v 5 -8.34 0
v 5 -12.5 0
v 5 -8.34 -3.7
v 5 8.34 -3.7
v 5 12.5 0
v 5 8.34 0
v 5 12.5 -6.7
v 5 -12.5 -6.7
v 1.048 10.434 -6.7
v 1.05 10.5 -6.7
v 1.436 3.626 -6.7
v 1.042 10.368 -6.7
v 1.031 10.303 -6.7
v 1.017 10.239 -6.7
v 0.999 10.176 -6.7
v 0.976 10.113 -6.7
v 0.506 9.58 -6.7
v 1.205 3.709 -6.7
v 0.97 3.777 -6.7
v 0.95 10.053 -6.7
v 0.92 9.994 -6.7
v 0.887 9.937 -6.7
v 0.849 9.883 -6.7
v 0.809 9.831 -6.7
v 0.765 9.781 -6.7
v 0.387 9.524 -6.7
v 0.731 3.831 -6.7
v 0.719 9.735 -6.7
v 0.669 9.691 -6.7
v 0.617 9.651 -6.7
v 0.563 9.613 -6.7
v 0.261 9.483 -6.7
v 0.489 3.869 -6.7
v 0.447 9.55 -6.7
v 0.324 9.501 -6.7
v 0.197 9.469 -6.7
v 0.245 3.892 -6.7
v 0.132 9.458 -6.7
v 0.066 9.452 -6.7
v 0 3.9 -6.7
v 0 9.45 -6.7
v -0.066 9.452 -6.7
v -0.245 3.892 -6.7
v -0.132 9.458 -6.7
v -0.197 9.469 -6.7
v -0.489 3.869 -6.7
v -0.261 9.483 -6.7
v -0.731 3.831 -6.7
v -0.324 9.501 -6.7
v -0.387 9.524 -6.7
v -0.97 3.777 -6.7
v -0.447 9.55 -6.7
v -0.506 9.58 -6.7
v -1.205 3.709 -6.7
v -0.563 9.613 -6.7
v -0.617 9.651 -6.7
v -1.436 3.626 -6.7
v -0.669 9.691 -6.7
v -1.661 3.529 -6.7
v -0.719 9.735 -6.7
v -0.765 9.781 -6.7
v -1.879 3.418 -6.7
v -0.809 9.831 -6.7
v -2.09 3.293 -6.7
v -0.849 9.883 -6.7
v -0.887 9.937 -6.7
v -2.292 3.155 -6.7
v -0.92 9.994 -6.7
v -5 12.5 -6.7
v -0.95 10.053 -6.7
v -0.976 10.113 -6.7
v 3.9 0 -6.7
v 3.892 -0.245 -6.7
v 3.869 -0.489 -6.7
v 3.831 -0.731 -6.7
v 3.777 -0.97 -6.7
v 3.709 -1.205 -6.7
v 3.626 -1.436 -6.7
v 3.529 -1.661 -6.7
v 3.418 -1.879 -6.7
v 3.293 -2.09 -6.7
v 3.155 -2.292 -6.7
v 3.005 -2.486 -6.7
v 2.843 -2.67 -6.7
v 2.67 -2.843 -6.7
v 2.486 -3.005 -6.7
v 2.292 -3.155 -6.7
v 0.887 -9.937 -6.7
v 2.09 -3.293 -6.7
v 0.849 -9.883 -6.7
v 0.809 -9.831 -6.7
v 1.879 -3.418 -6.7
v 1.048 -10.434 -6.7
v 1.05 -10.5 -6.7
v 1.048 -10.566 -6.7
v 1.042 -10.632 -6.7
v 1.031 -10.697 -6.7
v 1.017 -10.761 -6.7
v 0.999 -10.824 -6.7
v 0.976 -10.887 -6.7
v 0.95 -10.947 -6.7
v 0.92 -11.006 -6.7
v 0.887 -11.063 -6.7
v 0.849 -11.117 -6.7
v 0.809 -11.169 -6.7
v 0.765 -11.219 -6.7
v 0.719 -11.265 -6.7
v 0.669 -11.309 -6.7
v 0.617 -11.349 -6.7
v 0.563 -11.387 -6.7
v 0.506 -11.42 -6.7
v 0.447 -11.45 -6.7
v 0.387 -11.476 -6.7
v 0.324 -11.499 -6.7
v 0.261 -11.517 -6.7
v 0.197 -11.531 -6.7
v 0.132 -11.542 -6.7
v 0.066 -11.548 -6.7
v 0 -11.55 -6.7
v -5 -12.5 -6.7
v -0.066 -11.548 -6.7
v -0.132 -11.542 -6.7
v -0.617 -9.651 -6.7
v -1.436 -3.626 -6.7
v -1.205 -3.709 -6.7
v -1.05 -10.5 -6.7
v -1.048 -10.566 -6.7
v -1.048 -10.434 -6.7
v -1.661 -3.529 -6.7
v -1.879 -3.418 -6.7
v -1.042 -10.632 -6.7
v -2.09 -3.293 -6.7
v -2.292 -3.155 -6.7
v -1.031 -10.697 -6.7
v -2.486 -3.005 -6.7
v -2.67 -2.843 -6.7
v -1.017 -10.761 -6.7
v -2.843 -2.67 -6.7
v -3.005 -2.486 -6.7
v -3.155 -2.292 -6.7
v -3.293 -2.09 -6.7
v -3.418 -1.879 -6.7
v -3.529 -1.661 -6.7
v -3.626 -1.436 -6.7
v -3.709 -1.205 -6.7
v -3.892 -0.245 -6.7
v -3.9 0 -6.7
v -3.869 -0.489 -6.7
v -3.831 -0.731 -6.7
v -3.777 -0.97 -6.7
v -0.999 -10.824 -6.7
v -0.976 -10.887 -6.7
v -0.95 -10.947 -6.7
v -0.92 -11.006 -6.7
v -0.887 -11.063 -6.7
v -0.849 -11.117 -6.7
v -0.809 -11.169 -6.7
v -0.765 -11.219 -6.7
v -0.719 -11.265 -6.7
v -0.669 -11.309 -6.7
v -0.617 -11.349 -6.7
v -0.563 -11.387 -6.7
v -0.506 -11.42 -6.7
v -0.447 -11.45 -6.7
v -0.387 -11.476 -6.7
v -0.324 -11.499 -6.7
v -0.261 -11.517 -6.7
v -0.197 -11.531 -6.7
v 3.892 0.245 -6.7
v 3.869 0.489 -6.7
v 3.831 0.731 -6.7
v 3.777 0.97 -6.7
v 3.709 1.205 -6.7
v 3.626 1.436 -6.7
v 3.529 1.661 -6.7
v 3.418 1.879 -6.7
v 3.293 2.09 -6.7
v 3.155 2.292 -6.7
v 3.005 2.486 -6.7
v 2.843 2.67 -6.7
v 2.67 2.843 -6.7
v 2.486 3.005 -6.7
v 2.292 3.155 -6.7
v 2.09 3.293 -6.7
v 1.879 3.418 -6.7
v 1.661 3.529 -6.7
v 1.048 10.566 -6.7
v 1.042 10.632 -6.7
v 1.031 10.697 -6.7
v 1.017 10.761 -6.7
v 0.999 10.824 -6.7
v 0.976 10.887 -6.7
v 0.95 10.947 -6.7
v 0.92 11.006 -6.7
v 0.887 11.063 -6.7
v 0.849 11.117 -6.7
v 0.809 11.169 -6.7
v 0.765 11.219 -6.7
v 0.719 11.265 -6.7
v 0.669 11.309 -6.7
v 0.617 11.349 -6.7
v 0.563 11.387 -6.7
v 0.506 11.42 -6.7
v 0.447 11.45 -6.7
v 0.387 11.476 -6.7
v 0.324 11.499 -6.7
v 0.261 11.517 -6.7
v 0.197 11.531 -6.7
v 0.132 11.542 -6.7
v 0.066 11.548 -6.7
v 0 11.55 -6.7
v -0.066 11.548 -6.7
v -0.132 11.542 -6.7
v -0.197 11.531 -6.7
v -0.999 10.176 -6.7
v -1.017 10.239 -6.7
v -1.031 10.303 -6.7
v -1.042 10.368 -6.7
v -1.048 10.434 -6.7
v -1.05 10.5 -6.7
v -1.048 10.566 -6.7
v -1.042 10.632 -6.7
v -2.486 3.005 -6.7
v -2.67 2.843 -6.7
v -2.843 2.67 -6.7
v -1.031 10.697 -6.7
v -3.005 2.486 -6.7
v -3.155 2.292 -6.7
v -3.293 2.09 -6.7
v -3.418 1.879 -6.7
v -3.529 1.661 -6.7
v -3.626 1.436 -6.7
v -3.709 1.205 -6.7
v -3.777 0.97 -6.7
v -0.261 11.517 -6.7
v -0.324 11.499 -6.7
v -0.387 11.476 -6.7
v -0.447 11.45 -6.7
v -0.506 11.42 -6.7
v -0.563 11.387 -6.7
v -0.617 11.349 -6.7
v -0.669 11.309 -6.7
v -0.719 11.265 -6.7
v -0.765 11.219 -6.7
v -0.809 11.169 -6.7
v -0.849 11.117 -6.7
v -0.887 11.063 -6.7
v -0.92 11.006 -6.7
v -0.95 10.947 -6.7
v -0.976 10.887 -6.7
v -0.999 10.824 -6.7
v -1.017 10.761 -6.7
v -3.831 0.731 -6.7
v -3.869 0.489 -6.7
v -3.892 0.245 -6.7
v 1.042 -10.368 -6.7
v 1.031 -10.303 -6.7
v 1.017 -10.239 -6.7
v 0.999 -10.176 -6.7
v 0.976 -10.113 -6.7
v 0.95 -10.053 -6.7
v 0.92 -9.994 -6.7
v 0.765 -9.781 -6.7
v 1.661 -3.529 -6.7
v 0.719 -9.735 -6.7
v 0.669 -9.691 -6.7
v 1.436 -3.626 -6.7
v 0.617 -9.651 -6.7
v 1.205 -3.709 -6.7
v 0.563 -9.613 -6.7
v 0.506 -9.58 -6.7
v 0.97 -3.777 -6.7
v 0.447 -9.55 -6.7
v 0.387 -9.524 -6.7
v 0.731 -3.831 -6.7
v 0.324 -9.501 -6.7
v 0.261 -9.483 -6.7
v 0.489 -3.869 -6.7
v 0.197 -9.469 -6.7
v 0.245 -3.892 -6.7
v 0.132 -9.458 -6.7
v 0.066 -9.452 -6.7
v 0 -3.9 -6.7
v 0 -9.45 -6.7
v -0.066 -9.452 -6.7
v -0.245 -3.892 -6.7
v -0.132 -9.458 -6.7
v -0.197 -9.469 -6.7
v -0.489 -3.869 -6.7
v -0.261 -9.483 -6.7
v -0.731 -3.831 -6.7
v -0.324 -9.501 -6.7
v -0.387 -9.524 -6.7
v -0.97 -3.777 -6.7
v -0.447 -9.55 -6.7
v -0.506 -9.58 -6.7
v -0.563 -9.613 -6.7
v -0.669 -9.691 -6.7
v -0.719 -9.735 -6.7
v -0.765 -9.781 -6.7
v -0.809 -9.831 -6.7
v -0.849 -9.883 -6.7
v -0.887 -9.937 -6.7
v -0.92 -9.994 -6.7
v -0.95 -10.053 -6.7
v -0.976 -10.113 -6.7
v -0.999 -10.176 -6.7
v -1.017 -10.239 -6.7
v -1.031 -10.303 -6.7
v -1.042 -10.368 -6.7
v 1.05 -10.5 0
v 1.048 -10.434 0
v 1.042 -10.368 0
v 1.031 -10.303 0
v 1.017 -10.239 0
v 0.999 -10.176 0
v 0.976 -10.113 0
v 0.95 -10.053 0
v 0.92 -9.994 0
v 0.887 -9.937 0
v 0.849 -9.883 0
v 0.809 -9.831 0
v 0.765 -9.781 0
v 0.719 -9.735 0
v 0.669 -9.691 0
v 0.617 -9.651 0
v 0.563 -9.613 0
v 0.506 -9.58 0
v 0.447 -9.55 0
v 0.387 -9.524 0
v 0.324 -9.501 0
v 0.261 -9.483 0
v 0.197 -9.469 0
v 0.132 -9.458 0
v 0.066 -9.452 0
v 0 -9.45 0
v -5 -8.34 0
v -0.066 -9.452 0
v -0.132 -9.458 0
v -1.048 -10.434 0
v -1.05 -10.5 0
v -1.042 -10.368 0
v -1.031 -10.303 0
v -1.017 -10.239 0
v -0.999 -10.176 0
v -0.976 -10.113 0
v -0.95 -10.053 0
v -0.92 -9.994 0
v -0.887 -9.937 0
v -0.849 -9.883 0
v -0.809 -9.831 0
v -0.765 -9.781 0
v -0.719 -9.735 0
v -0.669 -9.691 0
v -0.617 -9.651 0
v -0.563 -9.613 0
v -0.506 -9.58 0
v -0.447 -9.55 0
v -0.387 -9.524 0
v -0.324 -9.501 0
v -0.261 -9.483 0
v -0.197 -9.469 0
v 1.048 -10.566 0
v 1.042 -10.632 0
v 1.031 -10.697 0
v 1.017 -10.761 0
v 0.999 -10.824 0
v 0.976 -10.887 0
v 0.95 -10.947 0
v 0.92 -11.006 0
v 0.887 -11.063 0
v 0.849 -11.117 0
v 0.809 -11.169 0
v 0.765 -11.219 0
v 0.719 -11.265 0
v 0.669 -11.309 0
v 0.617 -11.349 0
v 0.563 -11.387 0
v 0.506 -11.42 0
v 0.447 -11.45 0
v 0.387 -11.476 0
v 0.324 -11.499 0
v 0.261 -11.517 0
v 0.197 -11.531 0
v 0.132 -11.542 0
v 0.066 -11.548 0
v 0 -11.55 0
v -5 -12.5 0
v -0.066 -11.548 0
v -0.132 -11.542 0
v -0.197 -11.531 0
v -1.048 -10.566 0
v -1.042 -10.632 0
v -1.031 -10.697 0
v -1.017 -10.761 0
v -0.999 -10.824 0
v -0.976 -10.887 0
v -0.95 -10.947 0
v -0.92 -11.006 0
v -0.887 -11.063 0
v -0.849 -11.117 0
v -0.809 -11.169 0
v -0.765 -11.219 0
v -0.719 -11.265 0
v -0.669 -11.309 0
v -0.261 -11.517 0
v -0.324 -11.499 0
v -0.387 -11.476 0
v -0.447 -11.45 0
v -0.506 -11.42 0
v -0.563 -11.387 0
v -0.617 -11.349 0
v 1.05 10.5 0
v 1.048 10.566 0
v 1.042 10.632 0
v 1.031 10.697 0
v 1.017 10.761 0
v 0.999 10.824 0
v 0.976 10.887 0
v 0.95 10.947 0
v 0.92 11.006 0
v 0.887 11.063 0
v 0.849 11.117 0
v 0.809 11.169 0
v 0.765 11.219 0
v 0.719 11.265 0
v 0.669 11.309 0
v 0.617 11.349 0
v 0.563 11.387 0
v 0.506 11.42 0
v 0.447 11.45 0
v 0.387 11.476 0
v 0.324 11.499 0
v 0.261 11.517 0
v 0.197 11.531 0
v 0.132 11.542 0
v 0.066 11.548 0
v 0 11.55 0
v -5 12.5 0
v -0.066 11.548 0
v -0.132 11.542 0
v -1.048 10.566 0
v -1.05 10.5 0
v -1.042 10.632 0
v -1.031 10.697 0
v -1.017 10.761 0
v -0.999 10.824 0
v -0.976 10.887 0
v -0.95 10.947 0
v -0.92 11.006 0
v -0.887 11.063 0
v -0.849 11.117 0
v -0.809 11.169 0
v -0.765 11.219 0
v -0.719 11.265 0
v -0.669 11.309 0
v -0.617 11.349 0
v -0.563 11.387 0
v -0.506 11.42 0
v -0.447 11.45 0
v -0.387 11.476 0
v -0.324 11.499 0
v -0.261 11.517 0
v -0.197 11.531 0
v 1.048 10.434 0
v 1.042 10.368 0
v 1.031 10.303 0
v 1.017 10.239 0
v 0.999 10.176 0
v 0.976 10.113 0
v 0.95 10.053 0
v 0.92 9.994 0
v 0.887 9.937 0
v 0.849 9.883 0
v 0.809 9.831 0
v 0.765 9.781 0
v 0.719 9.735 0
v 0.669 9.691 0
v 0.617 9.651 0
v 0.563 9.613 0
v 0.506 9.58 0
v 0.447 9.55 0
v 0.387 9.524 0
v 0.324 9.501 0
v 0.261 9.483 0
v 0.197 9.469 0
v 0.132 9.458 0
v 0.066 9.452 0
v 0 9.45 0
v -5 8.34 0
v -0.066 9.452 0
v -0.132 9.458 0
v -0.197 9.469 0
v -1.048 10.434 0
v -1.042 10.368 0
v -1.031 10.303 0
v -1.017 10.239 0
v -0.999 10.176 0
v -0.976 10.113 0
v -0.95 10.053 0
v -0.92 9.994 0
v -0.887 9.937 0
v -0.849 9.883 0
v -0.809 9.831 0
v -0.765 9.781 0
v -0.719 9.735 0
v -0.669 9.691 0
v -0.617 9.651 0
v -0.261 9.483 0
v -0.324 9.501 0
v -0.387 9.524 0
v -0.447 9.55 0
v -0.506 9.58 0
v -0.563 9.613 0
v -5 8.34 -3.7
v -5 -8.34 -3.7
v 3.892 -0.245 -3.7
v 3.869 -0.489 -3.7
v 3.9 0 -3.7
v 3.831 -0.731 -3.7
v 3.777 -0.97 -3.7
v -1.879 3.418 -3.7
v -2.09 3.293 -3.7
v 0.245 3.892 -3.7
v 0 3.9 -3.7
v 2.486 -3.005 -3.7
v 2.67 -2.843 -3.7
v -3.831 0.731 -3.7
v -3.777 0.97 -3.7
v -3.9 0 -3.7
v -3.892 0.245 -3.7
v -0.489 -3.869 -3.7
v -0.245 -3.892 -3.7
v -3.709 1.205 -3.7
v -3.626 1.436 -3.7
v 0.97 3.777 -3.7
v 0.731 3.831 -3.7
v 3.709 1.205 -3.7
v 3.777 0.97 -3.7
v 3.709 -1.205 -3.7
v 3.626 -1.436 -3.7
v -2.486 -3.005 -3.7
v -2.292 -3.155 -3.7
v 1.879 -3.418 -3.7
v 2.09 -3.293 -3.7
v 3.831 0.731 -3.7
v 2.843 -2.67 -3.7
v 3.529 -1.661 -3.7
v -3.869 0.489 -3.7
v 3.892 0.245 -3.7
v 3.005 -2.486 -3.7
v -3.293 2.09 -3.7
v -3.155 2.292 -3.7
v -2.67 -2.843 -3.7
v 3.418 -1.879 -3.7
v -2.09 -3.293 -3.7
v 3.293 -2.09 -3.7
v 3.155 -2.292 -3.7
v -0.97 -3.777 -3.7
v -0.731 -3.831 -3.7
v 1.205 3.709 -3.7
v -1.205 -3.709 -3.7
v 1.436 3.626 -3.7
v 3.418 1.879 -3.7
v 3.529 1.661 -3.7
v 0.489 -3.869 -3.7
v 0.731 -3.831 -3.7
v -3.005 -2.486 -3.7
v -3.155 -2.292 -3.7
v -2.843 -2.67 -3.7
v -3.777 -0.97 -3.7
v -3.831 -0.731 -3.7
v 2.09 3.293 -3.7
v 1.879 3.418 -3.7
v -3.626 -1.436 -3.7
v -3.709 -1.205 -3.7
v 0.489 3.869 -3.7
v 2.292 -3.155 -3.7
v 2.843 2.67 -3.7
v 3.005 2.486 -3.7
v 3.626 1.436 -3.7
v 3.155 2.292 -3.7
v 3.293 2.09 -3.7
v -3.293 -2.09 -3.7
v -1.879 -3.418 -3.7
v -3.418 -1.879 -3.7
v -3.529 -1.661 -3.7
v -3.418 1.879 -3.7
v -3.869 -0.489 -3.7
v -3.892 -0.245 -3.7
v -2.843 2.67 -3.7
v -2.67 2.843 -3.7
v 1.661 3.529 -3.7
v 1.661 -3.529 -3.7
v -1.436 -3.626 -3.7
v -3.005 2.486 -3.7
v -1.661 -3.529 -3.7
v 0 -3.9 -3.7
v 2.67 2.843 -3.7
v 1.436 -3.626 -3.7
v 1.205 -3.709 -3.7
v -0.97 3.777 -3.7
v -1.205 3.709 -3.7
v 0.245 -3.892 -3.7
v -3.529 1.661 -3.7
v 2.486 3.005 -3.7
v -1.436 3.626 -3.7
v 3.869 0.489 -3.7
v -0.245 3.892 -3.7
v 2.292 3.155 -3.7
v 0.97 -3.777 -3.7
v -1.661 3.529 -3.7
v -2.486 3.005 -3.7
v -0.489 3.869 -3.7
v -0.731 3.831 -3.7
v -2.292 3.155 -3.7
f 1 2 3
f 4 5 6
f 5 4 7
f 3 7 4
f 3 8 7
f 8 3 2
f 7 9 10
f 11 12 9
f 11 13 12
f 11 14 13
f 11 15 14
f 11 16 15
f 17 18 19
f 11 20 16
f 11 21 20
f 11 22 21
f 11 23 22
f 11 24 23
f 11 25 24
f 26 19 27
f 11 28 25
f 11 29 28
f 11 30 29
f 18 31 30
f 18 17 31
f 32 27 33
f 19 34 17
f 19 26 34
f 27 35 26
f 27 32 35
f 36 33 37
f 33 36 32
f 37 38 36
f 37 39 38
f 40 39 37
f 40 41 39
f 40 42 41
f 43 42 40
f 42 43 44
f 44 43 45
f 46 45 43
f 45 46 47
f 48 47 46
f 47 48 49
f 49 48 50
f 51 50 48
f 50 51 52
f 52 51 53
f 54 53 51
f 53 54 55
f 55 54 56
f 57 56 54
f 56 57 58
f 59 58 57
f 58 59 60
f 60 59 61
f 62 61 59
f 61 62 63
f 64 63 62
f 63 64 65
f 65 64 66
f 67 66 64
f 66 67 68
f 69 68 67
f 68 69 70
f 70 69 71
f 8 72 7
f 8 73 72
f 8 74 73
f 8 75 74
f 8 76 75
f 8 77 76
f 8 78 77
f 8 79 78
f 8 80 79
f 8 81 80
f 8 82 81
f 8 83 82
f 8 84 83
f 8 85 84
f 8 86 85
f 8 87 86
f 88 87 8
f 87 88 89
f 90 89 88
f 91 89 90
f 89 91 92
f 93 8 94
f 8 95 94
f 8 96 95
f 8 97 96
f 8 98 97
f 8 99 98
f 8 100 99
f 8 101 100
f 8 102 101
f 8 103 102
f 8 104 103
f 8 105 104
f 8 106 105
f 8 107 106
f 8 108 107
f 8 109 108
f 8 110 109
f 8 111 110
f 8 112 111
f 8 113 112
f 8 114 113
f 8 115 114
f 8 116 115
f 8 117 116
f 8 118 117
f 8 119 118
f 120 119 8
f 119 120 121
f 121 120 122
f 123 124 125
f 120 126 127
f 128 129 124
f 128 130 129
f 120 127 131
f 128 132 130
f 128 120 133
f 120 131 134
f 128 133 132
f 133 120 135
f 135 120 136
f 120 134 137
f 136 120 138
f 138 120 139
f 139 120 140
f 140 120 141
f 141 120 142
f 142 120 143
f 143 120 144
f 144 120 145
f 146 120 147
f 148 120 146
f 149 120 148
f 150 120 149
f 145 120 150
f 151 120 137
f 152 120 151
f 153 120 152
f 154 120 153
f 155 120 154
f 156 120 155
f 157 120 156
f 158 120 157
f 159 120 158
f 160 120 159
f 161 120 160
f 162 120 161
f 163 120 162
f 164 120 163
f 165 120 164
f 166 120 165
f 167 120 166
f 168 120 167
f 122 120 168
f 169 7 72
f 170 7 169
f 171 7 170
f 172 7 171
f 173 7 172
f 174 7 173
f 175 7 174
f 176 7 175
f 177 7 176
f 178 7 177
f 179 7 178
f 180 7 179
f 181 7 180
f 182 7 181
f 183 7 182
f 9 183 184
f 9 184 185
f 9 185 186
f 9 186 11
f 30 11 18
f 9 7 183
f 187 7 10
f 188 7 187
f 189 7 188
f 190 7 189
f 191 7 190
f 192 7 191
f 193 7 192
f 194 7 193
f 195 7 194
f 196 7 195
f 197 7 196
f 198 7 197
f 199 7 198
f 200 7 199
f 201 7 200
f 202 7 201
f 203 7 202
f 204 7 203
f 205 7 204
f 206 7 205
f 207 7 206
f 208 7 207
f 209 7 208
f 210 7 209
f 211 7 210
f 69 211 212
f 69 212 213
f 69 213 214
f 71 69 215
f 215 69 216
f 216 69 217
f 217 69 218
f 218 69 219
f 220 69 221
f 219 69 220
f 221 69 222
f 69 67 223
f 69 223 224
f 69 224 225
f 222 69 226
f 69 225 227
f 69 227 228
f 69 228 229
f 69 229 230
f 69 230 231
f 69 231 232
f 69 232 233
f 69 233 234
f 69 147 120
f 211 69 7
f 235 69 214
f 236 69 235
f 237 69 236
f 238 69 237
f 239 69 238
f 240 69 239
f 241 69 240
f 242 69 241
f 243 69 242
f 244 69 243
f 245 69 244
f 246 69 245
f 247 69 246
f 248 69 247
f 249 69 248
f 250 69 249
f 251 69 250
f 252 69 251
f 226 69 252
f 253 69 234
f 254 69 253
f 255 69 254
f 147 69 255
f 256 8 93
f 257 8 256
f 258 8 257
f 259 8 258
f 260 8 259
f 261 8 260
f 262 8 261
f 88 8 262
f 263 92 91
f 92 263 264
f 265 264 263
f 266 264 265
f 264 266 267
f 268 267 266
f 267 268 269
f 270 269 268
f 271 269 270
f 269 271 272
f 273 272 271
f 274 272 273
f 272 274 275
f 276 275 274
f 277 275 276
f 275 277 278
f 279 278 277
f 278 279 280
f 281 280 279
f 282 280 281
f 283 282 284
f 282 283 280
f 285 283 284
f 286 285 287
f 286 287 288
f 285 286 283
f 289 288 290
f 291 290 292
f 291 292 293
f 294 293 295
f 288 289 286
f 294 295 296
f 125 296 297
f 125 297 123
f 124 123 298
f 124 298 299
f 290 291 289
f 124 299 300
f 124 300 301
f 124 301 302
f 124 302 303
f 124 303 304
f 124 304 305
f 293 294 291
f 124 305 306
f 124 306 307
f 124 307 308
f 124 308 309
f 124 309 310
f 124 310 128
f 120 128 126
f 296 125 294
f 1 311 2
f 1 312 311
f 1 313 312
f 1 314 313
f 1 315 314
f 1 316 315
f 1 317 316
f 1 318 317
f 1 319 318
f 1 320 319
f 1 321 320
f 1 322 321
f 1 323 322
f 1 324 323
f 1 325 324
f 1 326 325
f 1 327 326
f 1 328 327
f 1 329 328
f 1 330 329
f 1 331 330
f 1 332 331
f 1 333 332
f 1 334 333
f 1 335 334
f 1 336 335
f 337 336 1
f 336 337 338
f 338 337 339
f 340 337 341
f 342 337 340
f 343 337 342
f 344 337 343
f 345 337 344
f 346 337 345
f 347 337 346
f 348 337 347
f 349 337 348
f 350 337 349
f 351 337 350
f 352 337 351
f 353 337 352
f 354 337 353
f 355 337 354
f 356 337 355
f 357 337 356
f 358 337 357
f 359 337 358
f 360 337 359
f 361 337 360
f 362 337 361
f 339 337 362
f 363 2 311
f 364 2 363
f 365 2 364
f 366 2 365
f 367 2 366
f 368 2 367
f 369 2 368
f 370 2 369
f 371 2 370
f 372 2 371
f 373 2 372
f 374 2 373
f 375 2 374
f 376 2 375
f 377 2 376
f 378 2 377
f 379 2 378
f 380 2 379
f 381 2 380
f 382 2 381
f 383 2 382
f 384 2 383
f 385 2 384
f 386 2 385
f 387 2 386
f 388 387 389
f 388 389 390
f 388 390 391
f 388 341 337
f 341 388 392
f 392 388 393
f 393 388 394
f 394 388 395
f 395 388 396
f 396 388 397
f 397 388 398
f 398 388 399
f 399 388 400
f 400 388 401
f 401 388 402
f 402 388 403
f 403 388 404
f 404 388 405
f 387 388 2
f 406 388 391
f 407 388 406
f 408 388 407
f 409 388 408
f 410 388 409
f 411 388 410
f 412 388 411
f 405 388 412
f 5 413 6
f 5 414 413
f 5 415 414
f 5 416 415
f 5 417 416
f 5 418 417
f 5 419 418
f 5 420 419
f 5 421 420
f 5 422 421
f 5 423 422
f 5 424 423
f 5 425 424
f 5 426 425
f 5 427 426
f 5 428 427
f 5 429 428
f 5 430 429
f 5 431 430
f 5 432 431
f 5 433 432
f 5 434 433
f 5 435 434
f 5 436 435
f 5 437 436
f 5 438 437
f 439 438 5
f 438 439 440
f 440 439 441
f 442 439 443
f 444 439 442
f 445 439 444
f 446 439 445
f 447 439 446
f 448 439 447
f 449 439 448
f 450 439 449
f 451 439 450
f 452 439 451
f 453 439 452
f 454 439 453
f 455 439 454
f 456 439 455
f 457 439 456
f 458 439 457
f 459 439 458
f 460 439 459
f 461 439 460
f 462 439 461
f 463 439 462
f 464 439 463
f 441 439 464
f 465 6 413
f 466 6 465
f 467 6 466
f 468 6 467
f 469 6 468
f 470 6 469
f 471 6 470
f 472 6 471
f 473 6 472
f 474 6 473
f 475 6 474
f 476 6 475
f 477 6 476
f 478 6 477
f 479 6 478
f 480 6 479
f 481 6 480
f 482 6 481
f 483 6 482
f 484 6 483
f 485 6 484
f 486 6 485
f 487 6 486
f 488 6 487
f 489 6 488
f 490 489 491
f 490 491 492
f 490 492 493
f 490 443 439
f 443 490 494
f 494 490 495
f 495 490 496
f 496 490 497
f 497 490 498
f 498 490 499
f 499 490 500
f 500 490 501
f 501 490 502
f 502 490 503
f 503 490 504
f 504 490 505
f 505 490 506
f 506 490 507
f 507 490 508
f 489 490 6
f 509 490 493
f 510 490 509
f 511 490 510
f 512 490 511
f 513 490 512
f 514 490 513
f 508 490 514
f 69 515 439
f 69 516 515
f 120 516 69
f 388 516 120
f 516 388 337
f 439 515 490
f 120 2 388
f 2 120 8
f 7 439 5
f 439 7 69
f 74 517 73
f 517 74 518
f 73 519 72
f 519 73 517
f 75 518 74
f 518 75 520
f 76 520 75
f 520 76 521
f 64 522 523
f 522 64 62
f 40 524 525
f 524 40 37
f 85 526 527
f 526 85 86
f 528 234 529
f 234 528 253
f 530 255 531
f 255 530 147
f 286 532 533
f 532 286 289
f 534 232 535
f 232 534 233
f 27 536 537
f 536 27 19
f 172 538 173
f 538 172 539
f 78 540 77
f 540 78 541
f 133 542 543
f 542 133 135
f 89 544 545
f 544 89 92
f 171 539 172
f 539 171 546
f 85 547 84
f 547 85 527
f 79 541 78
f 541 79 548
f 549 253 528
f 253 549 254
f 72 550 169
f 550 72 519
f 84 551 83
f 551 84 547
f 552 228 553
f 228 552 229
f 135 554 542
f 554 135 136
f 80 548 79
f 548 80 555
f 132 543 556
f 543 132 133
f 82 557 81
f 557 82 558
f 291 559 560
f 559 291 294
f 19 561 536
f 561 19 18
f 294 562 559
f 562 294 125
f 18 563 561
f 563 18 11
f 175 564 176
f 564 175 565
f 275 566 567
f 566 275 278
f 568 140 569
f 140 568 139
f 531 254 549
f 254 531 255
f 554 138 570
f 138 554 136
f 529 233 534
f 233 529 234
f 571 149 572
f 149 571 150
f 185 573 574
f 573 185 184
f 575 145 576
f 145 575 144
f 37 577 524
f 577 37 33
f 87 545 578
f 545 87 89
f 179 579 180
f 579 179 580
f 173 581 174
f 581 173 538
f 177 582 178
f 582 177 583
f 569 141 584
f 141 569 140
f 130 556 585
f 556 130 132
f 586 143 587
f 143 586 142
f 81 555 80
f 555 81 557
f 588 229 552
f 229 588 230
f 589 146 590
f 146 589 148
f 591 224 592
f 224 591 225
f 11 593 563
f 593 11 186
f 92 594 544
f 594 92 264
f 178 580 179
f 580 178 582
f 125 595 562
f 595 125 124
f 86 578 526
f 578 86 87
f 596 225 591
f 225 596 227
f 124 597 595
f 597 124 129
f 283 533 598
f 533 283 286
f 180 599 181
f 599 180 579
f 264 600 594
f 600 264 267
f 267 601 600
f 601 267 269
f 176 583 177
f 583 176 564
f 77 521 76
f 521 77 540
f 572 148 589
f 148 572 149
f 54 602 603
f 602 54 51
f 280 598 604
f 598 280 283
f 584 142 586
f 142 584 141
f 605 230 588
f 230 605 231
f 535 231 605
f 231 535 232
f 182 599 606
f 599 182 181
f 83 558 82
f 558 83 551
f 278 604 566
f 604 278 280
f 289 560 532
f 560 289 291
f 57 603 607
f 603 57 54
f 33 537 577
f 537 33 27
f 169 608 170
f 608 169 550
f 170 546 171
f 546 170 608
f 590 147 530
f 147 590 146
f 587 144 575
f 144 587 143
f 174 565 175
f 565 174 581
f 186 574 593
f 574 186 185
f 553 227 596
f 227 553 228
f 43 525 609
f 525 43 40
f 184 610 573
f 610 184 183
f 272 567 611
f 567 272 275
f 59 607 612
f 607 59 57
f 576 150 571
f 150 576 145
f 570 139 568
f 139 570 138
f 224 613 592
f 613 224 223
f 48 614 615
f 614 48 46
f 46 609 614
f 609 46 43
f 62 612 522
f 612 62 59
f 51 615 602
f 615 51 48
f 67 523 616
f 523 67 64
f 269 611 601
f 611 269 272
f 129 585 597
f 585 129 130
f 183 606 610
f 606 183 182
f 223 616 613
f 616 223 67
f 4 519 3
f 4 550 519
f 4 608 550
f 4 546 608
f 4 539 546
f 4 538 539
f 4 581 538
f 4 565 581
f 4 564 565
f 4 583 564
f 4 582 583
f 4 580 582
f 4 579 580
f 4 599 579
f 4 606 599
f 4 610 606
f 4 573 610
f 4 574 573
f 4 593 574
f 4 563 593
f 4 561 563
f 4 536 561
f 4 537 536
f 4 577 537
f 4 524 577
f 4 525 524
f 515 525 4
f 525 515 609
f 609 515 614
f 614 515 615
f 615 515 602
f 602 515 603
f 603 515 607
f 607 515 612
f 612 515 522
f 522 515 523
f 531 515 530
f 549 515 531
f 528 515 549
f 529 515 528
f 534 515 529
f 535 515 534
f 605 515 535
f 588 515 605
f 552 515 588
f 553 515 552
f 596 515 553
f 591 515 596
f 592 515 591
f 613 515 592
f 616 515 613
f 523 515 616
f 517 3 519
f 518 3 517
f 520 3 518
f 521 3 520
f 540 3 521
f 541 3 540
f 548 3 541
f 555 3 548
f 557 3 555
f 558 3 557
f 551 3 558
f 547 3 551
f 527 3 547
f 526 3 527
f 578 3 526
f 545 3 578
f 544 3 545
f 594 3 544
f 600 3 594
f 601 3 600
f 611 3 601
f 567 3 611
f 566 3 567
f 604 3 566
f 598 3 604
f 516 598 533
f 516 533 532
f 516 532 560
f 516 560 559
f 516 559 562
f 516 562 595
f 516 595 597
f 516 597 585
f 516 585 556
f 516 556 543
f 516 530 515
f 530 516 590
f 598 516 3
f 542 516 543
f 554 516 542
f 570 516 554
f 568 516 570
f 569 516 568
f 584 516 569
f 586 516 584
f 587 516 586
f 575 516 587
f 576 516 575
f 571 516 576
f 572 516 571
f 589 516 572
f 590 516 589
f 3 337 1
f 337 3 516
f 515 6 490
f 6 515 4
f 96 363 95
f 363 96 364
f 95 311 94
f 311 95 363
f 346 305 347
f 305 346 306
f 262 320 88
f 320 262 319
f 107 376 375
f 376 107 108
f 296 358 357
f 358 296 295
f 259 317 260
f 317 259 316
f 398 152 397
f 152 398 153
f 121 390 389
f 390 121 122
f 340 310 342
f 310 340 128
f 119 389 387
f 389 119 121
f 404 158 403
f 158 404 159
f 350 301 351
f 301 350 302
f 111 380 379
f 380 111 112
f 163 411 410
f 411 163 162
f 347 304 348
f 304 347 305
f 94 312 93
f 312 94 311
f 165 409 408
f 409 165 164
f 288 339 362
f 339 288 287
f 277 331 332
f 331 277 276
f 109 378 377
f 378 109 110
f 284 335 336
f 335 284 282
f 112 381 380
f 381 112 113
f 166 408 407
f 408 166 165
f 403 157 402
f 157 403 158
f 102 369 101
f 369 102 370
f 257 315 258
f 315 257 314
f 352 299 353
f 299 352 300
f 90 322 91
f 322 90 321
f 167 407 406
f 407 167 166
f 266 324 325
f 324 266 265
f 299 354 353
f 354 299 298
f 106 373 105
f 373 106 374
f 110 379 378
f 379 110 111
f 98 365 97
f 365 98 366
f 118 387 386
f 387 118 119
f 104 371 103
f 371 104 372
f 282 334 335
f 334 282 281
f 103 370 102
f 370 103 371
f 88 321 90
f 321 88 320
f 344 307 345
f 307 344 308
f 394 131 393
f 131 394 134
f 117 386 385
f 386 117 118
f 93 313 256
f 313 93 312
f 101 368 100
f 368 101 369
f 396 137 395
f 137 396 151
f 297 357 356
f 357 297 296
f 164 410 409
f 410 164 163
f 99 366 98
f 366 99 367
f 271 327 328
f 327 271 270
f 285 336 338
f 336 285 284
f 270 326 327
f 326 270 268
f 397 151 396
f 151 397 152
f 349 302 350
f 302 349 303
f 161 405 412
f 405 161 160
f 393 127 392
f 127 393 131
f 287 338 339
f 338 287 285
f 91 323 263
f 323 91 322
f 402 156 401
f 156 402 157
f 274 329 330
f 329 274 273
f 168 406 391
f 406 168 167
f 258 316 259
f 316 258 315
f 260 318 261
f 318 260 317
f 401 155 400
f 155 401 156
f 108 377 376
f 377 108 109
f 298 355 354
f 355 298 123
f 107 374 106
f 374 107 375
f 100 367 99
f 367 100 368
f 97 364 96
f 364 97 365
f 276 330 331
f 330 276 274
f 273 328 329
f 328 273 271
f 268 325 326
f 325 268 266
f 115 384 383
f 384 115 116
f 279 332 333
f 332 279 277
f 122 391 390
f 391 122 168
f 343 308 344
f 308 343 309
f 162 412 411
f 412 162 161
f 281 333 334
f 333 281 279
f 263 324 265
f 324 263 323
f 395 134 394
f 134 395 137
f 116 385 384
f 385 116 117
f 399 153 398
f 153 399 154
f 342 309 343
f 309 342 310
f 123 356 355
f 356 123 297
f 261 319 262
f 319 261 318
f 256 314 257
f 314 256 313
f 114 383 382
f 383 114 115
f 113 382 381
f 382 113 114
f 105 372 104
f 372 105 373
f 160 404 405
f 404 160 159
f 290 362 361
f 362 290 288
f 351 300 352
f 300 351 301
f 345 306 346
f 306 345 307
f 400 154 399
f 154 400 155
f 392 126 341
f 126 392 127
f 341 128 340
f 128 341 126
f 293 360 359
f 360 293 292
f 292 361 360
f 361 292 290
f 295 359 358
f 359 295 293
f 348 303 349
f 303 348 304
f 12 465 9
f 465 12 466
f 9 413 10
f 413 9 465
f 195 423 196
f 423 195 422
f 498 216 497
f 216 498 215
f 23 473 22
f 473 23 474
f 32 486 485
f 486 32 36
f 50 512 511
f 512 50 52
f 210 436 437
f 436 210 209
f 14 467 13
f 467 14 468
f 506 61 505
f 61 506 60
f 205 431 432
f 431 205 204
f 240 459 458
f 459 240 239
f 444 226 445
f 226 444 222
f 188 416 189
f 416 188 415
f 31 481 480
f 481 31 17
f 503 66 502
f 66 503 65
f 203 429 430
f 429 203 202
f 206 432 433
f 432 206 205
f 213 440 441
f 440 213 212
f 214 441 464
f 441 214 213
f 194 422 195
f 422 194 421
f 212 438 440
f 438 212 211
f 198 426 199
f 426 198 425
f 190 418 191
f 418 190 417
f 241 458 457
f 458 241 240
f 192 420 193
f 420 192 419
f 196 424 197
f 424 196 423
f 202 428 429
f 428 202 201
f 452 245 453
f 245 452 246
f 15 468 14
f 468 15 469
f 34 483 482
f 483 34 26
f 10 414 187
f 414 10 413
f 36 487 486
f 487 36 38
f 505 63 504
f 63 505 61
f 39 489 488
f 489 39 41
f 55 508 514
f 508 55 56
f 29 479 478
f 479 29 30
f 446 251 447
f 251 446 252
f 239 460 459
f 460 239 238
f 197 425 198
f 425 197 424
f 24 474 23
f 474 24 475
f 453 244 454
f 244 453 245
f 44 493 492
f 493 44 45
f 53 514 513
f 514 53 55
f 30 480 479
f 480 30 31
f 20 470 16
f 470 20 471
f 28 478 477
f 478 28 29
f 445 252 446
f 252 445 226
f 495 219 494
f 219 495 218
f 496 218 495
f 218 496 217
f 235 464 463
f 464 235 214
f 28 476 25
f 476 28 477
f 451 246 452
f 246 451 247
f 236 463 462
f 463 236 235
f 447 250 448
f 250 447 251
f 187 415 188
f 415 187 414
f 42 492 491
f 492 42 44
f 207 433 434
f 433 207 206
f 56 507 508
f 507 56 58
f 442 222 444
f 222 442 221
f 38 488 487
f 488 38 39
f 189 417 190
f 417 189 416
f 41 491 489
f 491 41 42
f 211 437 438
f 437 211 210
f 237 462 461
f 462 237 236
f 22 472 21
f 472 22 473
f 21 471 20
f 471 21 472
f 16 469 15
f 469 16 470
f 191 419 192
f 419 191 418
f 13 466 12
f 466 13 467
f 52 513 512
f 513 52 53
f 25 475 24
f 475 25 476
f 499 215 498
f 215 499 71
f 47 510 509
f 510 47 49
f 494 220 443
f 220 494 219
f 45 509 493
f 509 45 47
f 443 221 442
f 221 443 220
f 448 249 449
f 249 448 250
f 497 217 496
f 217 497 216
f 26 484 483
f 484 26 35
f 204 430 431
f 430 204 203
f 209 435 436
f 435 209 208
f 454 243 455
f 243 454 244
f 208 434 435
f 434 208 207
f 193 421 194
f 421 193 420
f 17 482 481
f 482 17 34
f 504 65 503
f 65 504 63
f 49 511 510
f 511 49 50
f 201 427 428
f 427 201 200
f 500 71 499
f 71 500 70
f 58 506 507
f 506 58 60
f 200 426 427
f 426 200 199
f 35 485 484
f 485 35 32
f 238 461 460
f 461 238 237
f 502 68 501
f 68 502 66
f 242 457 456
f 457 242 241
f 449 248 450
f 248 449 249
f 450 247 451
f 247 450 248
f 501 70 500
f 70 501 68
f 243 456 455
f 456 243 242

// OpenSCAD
module inner_round_corner(r, h, ang=90, back = 0.1){
  cx = r*(1-cos(ang/2+45));
  translate([-r*(1-sin(ang/2+45)), -r*(1-sin(ang/2+45)),0])
  difference(){
    translate([-back, -back, 0])
    cube([cx+back, cx+back, h]);
    translate([r,r,-1])
      cylinder(r=r, h=h+2);
  }
}

module rounded_cube2(v, r){
  $fs = 1;
  if(v[2]){
    union(){
      translate([r,0,0])           cube([v[0]-2*r, v[1]    , v[2]]);
      translate([0,r,0])           cube([v[0]    , v[1]-2*r, v[2]]);
      translate([r,r,0])           cylinder(h=v[2], r=r);
      translate([v[0]-r,r,0])      cylinder(h=v[2], r=r);
      translate([v[0]-r,v[1]-r,0]) cylinder(h=v[2], r=r);
      translate([r,v[1]-r,0])      cylinder(h=v[2], r=r);
    }
  } else {
    union(){
      translate([r,0])           square([v[0]-2*r, v[1]    ]);
      translate([0,r])           square([v[0]    , v[1]-2*r]);
      translate([r,r])           circle(r=r);
      translate([v[0]-r,r])      circle(r=r);
      translate([v[0]-r,v[1]-r]) circle(r=r);
      translate([r,v[1]-r])      circle(r=r);
    }
  }
}

module top_rounded_cube2(v, r){
  translate([0,v[1],0])
    rotate([90,0,0])
      rounded_cube2([v[0], v[2], v[1]], r);
}


$fn=100;
module snurreskive_plate(){
  cylinder(d1 = 22, d2 = 17, h = 6.1);
}

module snurreskive_plate_plupp() {
  difference(){
    union() {
      translate([-3, -27/2/2, 0])
        top_rounded_cube2([6, 27/2, 14.3], 3);
      for(k=[0,1])
        mirror([k,0,0])
          translate([6/2, 27/2/2, 6.1])
          rotate([90,0,0])
          inner_round_corner(1, 27/2);
    }
    translate([0,0,14.3-3])
      rotate([90,0,0])
        cylinder(d=3.1, h=41, center=true);
  }
}

//snurreskive();
module snurreskive() {
  snurreskive_plate();
  snurreskive_plate_plupp();
}

width = 23.7;
height = 25;
th = 2;
screw_offs = 2;
screw_d = 2;
die_w = 8.34;


//!picam_die();
module picam_die(){
    translate([0,0,-0.1]) {
      cylinder(d = 7.18, h=6+0.1);
      translate([-die_w/2, -die_w/2, 0])
        cube([die_w, die_w, 3.3+0.1]);
    }
}

!rotate([180,0,0]) lens_hood_legs();
module lens_hood_legs() {
  difference(){
    translate([-10/2,-height/2,  0])
      cube([10,height,  6.7]);
    cylinder(d = 7.8, h=10);
    translate([-die_w, -die_w, -0.1])
      cube([2*die_w, 2*die_w, 3.8]);

    translate([0,height/2-screw_offs,-1])
      cylinder(d=2.1, h=10);
    translate([0,-(height/2-screw_offs),-1])
      cylinder(d=2.1, h=10);
  }
}

//!lens_hood();
module lens_hood() {
  hood_height = 16;
  v = 65/2;
  a = 3.68/2;
  b = tan(v)*hood_height - a;
  s = b/a;
  difference() {
    union(){
      translate([-5, -height/2, 0])
        cube([10,height,  1]);
      cylinder(d=7.18+2.5, h = hood_height-4);
    }
    translate([0,height/2-screw_offs,-1])
      cylinder(d=2.1, h=10);
    translate([0,-(height/2-screw_offs),-1])
      cylinder(d=2.1, h=10);
    translate([0,0,-2])
      cylinder(d=7.18, h = hood_height+2);
    translate([0,0,-1.75])
      linear_extrude(height=hood_height, scale=s)
        square([2.76, 3.68], center=true);
  }
}

//translate([9, -24/2, -7])
//!picam();
module picam() {
  difference() {
    cube([width, height, th]);
    translate([screw_offs, screw_offs, -1])
      cylinder(d=screw_d, h=4);
    translate([12.5+screw_offs, screw_offs, -1])
      cylinder(d=screw_d, h=4);
    translate([12.5+screw_offs, 25-screw_offs, -1])
      cylinder(d=screw_d, h=4);
    translate([screw_offs, 25-screw_offs, -1])
      cylinder(d=screw_d, h=4);
  }
  translate([12.5+screw_offs, height/2, th-0.1]) {
  color("grey")
    picam_die();
    lens_hood_legs();
    translate([0,0,7])
      lens_hood();
  }
}

module snurreskive2_inner() {
  cylinder(d1 = 31.5, d2 = 28.5, h=5.1);
}


//translate([(31)/2+3.5,0,-2]) {
//snurreskive2();
//translate([-2-12.5/2, -25/2, 9.6])
//  %picam();
//}
module snurreskive2() {
  difference() {
    union() {
      snurreskive2_inner();
      for(i=[1,-1])
        for(j=[1,-1])
          translate([i*12.5/2, j*21/2, 0])
            cylinder(d=4, h=9.5);
    }
    for(i=[1,-1])
      for(j=[1,-1])
        translate([i*12.5/2, j*21/2, -0.1]) {
          cylinder(d=2.1, h=9.7);
          // M2 nutlocks. Most people won't have M2 screws, so don't bother
          //cylinder(d=4/cos(30), h=2, $fn=6);
        }
  }

}


//vippeplate();
module vippeplate(){
    difference() {
      hull() {
        rotate([90,0,0])
          cylinder(d=6, h=35, center=true);
        translate([23,0,0])
          rotate([90,0,0])
            cylinder(d=6, h=35, center=true);
      }
      rotate([90,0,0])
         cylinder(d=3.1, h=100, center=true);
      cube([6.5, 27/2, 7], center=true);
      translate([(31)/2+4,0,-2]) {
        hull() {
          snurreskive2_inner();
          translate([20,0,0]) {
            snurreskive2_inner();
          }
        }
        hull() {
          translate([0,0,-2])
            cylinder(d=28.5, h=6);
          translate([20,0,-2])
            cylinder(d=28.5, h=6);
        }
      }
      translate([31/2+4,0,0]){
        rotate([0,0,90-10])
          rotate([0,90,0])
            cylinder(d=2.4, h=50);
        rotate([0,0,90+180+10])
          rotate([0,90,0])
            cylinder(d=2.4, h=50);
      }
    }
}

//base();
module base() {
  difference() {
    translate([0,0,-2])
      cylinder(d = 25 + 4, h=8);
    hull() {
      scale([1.01, 1.01, 1])
        snurreskive_plate();
      translate([0,-10,0])
        scale([1.01, 1.01, 1])
          snurreskive_plate();
    }
    rotate([0,0,90])
      translate([0,0,3.5])
        rotate([0,90,0])
          cylinder(d=2.7, h=50, center=true);
    rotate([0,0,-15])
      translate([0,0,3.5])
        rotate([0,90,0])
          cylinder(d=2.7, h=50);
    rotate([0,0,180+15])
      translate([0,0,3.5])
        rotate([0,90,0])
          cylinder(d=2.7, h=50);
  }
}

assembly();
module assembly() {
  translate([0,0,14.3-3]) {
    vippeplate();
    translate([(31)/2+3.5,0,-2]) {
      snurreskive2();
      translate([-2-12.5/2, -25/2, 9.6])
        %picam();
    }
  }
  base();
  snurreskive();
}
